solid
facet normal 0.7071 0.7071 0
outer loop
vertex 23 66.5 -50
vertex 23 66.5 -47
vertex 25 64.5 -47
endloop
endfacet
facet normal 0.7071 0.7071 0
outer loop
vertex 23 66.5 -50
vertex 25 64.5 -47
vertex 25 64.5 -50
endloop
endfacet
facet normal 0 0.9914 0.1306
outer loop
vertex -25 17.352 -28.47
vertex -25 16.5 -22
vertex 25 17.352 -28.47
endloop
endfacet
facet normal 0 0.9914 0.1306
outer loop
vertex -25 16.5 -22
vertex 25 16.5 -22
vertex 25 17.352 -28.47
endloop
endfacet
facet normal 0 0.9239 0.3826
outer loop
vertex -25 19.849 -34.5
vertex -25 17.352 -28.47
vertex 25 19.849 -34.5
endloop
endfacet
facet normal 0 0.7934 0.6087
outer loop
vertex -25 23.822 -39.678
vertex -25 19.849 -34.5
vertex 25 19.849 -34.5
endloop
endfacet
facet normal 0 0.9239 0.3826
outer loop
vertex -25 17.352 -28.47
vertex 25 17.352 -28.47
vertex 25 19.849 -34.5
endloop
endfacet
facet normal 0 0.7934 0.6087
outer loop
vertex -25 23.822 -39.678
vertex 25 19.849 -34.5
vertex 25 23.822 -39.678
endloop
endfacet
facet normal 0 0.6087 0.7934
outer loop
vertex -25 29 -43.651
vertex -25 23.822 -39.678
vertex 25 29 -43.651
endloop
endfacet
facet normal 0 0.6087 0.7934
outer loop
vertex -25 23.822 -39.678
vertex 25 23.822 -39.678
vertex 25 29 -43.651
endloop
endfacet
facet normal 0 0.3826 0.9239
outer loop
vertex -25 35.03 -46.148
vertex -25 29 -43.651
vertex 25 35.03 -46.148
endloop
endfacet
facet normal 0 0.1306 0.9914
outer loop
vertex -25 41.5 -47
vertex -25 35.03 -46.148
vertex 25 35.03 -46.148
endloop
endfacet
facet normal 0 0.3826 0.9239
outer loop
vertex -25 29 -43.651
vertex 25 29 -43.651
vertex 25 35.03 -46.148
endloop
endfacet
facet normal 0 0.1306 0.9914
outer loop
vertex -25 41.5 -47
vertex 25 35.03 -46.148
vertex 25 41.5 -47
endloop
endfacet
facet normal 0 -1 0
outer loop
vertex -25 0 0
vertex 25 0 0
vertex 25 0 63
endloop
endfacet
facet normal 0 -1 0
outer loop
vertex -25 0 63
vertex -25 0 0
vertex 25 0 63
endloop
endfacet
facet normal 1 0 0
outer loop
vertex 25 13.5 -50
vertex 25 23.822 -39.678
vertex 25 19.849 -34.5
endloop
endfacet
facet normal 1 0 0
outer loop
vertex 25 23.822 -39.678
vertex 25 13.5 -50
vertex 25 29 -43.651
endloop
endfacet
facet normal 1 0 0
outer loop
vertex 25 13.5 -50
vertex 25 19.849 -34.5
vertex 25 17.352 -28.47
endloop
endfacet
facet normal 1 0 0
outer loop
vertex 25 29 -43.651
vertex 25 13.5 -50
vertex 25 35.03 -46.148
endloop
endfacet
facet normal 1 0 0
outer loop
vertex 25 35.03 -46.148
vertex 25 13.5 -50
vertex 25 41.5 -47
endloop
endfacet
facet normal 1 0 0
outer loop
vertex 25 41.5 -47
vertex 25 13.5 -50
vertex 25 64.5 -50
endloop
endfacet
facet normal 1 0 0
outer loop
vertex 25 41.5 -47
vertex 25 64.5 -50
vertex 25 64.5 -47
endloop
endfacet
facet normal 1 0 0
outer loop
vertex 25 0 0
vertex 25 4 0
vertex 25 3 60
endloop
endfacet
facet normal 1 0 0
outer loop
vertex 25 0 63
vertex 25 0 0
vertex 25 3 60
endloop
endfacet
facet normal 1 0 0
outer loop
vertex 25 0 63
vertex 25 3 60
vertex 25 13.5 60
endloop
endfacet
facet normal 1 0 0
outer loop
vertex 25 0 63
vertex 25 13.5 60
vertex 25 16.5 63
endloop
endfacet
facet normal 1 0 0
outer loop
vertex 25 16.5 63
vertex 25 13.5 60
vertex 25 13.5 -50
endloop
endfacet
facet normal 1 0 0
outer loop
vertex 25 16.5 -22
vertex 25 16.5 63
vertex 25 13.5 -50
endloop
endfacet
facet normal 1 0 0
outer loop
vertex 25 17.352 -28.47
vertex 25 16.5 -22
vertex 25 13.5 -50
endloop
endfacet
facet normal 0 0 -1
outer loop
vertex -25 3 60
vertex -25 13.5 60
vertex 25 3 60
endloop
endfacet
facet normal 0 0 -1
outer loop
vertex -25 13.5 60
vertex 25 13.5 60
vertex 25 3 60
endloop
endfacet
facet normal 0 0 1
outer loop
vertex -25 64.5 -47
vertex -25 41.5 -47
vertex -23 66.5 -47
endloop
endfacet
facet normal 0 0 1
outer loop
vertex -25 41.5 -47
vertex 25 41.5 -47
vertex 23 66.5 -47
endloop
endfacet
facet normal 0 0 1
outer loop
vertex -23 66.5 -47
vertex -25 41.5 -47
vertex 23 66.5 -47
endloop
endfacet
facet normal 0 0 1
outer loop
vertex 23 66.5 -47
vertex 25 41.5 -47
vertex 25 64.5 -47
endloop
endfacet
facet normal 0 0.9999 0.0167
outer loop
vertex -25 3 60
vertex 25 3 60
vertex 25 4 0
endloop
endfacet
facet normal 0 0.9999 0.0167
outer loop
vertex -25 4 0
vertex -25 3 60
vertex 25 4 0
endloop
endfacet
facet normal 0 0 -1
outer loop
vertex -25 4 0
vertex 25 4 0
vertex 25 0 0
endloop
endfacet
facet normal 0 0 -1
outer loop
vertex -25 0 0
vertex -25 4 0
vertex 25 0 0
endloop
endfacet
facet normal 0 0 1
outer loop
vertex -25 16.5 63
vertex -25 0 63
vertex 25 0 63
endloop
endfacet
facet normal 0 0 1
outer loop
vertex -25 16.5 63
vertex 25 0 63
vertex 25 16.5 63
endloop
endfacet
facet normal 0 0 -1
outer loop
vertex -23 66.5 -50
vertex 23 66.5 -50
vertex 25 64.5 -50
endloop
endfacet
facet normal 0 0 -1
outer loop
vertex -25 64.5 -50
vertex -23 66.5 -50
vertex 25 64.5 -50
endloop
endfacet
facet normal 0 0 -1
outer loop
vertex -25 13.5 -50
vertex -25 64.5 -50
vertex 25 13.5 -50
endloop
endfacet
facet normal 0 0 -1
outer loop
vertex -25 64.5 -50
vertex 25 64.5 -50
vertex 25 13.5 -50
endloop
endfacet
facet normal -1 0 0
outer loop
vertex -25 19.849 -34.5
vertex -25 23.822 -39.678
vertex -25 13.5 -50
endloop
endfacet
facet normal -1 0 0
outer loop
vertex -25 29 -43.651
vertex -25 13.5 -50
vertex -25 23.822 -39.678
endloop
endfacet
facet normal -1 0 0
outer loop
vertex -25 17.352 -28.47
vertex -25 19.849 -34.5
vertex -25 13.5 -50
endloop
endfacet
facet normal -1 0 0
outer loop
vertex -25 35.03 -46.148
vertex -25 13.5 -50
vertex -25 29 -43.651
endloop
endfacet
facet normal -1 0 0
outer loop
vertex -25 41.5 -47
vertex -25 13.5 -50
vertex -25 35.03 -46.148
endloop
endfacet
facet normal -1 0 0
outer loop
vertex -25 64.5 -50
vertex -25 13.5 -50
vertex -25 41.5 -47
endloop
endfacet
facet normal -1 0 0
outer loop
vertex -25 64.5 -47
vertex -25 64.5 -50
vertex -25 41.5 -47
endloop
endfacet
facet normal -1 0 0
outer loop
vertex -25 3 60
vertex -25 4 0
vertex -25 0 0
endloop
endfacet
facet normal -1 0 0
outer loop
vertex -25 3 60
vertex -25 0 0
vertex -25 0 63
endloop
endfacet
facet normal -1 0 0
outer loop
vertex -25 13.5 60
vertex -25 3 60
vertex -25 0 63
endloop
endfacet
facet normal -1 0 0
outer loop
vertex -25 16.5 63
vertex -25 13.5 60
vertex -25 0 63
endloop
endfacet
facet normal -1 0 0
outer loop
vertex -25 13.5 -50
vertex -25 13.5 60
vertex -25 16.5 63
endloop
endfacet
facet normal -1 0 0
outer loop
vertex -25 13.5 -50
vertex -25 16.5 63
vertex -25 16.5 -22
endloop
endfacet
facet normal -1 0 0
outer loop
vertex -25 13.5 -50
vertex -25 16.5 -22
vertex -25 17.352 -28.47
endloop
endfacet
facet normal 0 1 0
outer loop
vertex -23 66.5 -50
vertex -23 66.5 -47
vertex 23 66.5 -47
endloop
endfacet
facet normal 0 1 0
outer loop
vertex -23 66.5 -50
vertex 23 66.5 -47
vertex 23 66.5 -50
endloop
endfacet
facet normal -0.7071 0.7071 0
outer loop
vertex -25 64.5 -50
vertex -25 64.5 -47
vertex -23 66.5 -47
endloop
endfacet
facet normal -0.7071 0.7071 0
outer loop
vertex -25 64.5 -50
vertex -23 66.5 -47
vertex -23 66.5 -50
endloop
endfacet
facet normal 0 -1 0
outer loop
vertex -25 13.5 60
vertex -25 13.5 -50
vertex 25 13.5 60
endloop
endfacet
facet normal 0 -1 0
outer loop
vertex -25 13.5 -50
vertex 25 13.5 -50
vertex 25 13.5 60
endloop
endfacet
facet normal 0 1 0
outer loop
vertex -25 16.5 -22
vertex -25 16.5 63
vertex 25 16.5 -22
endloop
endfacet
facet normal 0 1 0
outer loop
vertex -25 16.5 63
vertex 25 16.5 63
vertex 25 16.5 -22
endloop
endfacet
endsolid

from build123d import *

# Parameters (mm, degrees)
RESSALTO_EXTRUS_O1_DEPTH = 25
CHANFRO1_SIZE            = 2


with BuildPart() as part:
    # Esboço1 → Ressalto-extrusão1 (new, symmetric)
    with BuildSketch(Plane(origin=(0, 0, 0), x_dir=(0, 0, -1), z_dir=(1, 0, 0))):
        with BuildLine():
            Line((0, 0), (-63, 0))
            Line((-63, 0), (-63, 16.5))
            Line((-63, 16.5), (22, 16.5))
            ThreePointArc((22, 16.5), (39.67766953, 23.82233047), (47, 41.5))
            Line((47, 41.5), (47, 66.5))
            Line((47, 66.5), (50, 66.5))
            Line((50, 66.5), (50, 13.5))
            Line((50, 13.5), (-60, 13.5))
            Line((-60, 13.5), (-60, 3))
            Line((-60, 3), (0, 4))
            Line((0, 4), (0, 3))
            Line((0, 3), (0, 0))
        make_face()
    extrude(amount=RESSALTO_EXTRUS_O1_DEPTH, both=True)

    # Chanfro1
    chanfro1_edges = [part.edges().sort_by_distance(p)[0] for p in [
        (-25, 66.5, -48.5),
        (25, 66.5, -48.5),
    ]]
    chamfer(chanfro1_edges, length=CHANFRO1_SIZE)


solid = part.part
